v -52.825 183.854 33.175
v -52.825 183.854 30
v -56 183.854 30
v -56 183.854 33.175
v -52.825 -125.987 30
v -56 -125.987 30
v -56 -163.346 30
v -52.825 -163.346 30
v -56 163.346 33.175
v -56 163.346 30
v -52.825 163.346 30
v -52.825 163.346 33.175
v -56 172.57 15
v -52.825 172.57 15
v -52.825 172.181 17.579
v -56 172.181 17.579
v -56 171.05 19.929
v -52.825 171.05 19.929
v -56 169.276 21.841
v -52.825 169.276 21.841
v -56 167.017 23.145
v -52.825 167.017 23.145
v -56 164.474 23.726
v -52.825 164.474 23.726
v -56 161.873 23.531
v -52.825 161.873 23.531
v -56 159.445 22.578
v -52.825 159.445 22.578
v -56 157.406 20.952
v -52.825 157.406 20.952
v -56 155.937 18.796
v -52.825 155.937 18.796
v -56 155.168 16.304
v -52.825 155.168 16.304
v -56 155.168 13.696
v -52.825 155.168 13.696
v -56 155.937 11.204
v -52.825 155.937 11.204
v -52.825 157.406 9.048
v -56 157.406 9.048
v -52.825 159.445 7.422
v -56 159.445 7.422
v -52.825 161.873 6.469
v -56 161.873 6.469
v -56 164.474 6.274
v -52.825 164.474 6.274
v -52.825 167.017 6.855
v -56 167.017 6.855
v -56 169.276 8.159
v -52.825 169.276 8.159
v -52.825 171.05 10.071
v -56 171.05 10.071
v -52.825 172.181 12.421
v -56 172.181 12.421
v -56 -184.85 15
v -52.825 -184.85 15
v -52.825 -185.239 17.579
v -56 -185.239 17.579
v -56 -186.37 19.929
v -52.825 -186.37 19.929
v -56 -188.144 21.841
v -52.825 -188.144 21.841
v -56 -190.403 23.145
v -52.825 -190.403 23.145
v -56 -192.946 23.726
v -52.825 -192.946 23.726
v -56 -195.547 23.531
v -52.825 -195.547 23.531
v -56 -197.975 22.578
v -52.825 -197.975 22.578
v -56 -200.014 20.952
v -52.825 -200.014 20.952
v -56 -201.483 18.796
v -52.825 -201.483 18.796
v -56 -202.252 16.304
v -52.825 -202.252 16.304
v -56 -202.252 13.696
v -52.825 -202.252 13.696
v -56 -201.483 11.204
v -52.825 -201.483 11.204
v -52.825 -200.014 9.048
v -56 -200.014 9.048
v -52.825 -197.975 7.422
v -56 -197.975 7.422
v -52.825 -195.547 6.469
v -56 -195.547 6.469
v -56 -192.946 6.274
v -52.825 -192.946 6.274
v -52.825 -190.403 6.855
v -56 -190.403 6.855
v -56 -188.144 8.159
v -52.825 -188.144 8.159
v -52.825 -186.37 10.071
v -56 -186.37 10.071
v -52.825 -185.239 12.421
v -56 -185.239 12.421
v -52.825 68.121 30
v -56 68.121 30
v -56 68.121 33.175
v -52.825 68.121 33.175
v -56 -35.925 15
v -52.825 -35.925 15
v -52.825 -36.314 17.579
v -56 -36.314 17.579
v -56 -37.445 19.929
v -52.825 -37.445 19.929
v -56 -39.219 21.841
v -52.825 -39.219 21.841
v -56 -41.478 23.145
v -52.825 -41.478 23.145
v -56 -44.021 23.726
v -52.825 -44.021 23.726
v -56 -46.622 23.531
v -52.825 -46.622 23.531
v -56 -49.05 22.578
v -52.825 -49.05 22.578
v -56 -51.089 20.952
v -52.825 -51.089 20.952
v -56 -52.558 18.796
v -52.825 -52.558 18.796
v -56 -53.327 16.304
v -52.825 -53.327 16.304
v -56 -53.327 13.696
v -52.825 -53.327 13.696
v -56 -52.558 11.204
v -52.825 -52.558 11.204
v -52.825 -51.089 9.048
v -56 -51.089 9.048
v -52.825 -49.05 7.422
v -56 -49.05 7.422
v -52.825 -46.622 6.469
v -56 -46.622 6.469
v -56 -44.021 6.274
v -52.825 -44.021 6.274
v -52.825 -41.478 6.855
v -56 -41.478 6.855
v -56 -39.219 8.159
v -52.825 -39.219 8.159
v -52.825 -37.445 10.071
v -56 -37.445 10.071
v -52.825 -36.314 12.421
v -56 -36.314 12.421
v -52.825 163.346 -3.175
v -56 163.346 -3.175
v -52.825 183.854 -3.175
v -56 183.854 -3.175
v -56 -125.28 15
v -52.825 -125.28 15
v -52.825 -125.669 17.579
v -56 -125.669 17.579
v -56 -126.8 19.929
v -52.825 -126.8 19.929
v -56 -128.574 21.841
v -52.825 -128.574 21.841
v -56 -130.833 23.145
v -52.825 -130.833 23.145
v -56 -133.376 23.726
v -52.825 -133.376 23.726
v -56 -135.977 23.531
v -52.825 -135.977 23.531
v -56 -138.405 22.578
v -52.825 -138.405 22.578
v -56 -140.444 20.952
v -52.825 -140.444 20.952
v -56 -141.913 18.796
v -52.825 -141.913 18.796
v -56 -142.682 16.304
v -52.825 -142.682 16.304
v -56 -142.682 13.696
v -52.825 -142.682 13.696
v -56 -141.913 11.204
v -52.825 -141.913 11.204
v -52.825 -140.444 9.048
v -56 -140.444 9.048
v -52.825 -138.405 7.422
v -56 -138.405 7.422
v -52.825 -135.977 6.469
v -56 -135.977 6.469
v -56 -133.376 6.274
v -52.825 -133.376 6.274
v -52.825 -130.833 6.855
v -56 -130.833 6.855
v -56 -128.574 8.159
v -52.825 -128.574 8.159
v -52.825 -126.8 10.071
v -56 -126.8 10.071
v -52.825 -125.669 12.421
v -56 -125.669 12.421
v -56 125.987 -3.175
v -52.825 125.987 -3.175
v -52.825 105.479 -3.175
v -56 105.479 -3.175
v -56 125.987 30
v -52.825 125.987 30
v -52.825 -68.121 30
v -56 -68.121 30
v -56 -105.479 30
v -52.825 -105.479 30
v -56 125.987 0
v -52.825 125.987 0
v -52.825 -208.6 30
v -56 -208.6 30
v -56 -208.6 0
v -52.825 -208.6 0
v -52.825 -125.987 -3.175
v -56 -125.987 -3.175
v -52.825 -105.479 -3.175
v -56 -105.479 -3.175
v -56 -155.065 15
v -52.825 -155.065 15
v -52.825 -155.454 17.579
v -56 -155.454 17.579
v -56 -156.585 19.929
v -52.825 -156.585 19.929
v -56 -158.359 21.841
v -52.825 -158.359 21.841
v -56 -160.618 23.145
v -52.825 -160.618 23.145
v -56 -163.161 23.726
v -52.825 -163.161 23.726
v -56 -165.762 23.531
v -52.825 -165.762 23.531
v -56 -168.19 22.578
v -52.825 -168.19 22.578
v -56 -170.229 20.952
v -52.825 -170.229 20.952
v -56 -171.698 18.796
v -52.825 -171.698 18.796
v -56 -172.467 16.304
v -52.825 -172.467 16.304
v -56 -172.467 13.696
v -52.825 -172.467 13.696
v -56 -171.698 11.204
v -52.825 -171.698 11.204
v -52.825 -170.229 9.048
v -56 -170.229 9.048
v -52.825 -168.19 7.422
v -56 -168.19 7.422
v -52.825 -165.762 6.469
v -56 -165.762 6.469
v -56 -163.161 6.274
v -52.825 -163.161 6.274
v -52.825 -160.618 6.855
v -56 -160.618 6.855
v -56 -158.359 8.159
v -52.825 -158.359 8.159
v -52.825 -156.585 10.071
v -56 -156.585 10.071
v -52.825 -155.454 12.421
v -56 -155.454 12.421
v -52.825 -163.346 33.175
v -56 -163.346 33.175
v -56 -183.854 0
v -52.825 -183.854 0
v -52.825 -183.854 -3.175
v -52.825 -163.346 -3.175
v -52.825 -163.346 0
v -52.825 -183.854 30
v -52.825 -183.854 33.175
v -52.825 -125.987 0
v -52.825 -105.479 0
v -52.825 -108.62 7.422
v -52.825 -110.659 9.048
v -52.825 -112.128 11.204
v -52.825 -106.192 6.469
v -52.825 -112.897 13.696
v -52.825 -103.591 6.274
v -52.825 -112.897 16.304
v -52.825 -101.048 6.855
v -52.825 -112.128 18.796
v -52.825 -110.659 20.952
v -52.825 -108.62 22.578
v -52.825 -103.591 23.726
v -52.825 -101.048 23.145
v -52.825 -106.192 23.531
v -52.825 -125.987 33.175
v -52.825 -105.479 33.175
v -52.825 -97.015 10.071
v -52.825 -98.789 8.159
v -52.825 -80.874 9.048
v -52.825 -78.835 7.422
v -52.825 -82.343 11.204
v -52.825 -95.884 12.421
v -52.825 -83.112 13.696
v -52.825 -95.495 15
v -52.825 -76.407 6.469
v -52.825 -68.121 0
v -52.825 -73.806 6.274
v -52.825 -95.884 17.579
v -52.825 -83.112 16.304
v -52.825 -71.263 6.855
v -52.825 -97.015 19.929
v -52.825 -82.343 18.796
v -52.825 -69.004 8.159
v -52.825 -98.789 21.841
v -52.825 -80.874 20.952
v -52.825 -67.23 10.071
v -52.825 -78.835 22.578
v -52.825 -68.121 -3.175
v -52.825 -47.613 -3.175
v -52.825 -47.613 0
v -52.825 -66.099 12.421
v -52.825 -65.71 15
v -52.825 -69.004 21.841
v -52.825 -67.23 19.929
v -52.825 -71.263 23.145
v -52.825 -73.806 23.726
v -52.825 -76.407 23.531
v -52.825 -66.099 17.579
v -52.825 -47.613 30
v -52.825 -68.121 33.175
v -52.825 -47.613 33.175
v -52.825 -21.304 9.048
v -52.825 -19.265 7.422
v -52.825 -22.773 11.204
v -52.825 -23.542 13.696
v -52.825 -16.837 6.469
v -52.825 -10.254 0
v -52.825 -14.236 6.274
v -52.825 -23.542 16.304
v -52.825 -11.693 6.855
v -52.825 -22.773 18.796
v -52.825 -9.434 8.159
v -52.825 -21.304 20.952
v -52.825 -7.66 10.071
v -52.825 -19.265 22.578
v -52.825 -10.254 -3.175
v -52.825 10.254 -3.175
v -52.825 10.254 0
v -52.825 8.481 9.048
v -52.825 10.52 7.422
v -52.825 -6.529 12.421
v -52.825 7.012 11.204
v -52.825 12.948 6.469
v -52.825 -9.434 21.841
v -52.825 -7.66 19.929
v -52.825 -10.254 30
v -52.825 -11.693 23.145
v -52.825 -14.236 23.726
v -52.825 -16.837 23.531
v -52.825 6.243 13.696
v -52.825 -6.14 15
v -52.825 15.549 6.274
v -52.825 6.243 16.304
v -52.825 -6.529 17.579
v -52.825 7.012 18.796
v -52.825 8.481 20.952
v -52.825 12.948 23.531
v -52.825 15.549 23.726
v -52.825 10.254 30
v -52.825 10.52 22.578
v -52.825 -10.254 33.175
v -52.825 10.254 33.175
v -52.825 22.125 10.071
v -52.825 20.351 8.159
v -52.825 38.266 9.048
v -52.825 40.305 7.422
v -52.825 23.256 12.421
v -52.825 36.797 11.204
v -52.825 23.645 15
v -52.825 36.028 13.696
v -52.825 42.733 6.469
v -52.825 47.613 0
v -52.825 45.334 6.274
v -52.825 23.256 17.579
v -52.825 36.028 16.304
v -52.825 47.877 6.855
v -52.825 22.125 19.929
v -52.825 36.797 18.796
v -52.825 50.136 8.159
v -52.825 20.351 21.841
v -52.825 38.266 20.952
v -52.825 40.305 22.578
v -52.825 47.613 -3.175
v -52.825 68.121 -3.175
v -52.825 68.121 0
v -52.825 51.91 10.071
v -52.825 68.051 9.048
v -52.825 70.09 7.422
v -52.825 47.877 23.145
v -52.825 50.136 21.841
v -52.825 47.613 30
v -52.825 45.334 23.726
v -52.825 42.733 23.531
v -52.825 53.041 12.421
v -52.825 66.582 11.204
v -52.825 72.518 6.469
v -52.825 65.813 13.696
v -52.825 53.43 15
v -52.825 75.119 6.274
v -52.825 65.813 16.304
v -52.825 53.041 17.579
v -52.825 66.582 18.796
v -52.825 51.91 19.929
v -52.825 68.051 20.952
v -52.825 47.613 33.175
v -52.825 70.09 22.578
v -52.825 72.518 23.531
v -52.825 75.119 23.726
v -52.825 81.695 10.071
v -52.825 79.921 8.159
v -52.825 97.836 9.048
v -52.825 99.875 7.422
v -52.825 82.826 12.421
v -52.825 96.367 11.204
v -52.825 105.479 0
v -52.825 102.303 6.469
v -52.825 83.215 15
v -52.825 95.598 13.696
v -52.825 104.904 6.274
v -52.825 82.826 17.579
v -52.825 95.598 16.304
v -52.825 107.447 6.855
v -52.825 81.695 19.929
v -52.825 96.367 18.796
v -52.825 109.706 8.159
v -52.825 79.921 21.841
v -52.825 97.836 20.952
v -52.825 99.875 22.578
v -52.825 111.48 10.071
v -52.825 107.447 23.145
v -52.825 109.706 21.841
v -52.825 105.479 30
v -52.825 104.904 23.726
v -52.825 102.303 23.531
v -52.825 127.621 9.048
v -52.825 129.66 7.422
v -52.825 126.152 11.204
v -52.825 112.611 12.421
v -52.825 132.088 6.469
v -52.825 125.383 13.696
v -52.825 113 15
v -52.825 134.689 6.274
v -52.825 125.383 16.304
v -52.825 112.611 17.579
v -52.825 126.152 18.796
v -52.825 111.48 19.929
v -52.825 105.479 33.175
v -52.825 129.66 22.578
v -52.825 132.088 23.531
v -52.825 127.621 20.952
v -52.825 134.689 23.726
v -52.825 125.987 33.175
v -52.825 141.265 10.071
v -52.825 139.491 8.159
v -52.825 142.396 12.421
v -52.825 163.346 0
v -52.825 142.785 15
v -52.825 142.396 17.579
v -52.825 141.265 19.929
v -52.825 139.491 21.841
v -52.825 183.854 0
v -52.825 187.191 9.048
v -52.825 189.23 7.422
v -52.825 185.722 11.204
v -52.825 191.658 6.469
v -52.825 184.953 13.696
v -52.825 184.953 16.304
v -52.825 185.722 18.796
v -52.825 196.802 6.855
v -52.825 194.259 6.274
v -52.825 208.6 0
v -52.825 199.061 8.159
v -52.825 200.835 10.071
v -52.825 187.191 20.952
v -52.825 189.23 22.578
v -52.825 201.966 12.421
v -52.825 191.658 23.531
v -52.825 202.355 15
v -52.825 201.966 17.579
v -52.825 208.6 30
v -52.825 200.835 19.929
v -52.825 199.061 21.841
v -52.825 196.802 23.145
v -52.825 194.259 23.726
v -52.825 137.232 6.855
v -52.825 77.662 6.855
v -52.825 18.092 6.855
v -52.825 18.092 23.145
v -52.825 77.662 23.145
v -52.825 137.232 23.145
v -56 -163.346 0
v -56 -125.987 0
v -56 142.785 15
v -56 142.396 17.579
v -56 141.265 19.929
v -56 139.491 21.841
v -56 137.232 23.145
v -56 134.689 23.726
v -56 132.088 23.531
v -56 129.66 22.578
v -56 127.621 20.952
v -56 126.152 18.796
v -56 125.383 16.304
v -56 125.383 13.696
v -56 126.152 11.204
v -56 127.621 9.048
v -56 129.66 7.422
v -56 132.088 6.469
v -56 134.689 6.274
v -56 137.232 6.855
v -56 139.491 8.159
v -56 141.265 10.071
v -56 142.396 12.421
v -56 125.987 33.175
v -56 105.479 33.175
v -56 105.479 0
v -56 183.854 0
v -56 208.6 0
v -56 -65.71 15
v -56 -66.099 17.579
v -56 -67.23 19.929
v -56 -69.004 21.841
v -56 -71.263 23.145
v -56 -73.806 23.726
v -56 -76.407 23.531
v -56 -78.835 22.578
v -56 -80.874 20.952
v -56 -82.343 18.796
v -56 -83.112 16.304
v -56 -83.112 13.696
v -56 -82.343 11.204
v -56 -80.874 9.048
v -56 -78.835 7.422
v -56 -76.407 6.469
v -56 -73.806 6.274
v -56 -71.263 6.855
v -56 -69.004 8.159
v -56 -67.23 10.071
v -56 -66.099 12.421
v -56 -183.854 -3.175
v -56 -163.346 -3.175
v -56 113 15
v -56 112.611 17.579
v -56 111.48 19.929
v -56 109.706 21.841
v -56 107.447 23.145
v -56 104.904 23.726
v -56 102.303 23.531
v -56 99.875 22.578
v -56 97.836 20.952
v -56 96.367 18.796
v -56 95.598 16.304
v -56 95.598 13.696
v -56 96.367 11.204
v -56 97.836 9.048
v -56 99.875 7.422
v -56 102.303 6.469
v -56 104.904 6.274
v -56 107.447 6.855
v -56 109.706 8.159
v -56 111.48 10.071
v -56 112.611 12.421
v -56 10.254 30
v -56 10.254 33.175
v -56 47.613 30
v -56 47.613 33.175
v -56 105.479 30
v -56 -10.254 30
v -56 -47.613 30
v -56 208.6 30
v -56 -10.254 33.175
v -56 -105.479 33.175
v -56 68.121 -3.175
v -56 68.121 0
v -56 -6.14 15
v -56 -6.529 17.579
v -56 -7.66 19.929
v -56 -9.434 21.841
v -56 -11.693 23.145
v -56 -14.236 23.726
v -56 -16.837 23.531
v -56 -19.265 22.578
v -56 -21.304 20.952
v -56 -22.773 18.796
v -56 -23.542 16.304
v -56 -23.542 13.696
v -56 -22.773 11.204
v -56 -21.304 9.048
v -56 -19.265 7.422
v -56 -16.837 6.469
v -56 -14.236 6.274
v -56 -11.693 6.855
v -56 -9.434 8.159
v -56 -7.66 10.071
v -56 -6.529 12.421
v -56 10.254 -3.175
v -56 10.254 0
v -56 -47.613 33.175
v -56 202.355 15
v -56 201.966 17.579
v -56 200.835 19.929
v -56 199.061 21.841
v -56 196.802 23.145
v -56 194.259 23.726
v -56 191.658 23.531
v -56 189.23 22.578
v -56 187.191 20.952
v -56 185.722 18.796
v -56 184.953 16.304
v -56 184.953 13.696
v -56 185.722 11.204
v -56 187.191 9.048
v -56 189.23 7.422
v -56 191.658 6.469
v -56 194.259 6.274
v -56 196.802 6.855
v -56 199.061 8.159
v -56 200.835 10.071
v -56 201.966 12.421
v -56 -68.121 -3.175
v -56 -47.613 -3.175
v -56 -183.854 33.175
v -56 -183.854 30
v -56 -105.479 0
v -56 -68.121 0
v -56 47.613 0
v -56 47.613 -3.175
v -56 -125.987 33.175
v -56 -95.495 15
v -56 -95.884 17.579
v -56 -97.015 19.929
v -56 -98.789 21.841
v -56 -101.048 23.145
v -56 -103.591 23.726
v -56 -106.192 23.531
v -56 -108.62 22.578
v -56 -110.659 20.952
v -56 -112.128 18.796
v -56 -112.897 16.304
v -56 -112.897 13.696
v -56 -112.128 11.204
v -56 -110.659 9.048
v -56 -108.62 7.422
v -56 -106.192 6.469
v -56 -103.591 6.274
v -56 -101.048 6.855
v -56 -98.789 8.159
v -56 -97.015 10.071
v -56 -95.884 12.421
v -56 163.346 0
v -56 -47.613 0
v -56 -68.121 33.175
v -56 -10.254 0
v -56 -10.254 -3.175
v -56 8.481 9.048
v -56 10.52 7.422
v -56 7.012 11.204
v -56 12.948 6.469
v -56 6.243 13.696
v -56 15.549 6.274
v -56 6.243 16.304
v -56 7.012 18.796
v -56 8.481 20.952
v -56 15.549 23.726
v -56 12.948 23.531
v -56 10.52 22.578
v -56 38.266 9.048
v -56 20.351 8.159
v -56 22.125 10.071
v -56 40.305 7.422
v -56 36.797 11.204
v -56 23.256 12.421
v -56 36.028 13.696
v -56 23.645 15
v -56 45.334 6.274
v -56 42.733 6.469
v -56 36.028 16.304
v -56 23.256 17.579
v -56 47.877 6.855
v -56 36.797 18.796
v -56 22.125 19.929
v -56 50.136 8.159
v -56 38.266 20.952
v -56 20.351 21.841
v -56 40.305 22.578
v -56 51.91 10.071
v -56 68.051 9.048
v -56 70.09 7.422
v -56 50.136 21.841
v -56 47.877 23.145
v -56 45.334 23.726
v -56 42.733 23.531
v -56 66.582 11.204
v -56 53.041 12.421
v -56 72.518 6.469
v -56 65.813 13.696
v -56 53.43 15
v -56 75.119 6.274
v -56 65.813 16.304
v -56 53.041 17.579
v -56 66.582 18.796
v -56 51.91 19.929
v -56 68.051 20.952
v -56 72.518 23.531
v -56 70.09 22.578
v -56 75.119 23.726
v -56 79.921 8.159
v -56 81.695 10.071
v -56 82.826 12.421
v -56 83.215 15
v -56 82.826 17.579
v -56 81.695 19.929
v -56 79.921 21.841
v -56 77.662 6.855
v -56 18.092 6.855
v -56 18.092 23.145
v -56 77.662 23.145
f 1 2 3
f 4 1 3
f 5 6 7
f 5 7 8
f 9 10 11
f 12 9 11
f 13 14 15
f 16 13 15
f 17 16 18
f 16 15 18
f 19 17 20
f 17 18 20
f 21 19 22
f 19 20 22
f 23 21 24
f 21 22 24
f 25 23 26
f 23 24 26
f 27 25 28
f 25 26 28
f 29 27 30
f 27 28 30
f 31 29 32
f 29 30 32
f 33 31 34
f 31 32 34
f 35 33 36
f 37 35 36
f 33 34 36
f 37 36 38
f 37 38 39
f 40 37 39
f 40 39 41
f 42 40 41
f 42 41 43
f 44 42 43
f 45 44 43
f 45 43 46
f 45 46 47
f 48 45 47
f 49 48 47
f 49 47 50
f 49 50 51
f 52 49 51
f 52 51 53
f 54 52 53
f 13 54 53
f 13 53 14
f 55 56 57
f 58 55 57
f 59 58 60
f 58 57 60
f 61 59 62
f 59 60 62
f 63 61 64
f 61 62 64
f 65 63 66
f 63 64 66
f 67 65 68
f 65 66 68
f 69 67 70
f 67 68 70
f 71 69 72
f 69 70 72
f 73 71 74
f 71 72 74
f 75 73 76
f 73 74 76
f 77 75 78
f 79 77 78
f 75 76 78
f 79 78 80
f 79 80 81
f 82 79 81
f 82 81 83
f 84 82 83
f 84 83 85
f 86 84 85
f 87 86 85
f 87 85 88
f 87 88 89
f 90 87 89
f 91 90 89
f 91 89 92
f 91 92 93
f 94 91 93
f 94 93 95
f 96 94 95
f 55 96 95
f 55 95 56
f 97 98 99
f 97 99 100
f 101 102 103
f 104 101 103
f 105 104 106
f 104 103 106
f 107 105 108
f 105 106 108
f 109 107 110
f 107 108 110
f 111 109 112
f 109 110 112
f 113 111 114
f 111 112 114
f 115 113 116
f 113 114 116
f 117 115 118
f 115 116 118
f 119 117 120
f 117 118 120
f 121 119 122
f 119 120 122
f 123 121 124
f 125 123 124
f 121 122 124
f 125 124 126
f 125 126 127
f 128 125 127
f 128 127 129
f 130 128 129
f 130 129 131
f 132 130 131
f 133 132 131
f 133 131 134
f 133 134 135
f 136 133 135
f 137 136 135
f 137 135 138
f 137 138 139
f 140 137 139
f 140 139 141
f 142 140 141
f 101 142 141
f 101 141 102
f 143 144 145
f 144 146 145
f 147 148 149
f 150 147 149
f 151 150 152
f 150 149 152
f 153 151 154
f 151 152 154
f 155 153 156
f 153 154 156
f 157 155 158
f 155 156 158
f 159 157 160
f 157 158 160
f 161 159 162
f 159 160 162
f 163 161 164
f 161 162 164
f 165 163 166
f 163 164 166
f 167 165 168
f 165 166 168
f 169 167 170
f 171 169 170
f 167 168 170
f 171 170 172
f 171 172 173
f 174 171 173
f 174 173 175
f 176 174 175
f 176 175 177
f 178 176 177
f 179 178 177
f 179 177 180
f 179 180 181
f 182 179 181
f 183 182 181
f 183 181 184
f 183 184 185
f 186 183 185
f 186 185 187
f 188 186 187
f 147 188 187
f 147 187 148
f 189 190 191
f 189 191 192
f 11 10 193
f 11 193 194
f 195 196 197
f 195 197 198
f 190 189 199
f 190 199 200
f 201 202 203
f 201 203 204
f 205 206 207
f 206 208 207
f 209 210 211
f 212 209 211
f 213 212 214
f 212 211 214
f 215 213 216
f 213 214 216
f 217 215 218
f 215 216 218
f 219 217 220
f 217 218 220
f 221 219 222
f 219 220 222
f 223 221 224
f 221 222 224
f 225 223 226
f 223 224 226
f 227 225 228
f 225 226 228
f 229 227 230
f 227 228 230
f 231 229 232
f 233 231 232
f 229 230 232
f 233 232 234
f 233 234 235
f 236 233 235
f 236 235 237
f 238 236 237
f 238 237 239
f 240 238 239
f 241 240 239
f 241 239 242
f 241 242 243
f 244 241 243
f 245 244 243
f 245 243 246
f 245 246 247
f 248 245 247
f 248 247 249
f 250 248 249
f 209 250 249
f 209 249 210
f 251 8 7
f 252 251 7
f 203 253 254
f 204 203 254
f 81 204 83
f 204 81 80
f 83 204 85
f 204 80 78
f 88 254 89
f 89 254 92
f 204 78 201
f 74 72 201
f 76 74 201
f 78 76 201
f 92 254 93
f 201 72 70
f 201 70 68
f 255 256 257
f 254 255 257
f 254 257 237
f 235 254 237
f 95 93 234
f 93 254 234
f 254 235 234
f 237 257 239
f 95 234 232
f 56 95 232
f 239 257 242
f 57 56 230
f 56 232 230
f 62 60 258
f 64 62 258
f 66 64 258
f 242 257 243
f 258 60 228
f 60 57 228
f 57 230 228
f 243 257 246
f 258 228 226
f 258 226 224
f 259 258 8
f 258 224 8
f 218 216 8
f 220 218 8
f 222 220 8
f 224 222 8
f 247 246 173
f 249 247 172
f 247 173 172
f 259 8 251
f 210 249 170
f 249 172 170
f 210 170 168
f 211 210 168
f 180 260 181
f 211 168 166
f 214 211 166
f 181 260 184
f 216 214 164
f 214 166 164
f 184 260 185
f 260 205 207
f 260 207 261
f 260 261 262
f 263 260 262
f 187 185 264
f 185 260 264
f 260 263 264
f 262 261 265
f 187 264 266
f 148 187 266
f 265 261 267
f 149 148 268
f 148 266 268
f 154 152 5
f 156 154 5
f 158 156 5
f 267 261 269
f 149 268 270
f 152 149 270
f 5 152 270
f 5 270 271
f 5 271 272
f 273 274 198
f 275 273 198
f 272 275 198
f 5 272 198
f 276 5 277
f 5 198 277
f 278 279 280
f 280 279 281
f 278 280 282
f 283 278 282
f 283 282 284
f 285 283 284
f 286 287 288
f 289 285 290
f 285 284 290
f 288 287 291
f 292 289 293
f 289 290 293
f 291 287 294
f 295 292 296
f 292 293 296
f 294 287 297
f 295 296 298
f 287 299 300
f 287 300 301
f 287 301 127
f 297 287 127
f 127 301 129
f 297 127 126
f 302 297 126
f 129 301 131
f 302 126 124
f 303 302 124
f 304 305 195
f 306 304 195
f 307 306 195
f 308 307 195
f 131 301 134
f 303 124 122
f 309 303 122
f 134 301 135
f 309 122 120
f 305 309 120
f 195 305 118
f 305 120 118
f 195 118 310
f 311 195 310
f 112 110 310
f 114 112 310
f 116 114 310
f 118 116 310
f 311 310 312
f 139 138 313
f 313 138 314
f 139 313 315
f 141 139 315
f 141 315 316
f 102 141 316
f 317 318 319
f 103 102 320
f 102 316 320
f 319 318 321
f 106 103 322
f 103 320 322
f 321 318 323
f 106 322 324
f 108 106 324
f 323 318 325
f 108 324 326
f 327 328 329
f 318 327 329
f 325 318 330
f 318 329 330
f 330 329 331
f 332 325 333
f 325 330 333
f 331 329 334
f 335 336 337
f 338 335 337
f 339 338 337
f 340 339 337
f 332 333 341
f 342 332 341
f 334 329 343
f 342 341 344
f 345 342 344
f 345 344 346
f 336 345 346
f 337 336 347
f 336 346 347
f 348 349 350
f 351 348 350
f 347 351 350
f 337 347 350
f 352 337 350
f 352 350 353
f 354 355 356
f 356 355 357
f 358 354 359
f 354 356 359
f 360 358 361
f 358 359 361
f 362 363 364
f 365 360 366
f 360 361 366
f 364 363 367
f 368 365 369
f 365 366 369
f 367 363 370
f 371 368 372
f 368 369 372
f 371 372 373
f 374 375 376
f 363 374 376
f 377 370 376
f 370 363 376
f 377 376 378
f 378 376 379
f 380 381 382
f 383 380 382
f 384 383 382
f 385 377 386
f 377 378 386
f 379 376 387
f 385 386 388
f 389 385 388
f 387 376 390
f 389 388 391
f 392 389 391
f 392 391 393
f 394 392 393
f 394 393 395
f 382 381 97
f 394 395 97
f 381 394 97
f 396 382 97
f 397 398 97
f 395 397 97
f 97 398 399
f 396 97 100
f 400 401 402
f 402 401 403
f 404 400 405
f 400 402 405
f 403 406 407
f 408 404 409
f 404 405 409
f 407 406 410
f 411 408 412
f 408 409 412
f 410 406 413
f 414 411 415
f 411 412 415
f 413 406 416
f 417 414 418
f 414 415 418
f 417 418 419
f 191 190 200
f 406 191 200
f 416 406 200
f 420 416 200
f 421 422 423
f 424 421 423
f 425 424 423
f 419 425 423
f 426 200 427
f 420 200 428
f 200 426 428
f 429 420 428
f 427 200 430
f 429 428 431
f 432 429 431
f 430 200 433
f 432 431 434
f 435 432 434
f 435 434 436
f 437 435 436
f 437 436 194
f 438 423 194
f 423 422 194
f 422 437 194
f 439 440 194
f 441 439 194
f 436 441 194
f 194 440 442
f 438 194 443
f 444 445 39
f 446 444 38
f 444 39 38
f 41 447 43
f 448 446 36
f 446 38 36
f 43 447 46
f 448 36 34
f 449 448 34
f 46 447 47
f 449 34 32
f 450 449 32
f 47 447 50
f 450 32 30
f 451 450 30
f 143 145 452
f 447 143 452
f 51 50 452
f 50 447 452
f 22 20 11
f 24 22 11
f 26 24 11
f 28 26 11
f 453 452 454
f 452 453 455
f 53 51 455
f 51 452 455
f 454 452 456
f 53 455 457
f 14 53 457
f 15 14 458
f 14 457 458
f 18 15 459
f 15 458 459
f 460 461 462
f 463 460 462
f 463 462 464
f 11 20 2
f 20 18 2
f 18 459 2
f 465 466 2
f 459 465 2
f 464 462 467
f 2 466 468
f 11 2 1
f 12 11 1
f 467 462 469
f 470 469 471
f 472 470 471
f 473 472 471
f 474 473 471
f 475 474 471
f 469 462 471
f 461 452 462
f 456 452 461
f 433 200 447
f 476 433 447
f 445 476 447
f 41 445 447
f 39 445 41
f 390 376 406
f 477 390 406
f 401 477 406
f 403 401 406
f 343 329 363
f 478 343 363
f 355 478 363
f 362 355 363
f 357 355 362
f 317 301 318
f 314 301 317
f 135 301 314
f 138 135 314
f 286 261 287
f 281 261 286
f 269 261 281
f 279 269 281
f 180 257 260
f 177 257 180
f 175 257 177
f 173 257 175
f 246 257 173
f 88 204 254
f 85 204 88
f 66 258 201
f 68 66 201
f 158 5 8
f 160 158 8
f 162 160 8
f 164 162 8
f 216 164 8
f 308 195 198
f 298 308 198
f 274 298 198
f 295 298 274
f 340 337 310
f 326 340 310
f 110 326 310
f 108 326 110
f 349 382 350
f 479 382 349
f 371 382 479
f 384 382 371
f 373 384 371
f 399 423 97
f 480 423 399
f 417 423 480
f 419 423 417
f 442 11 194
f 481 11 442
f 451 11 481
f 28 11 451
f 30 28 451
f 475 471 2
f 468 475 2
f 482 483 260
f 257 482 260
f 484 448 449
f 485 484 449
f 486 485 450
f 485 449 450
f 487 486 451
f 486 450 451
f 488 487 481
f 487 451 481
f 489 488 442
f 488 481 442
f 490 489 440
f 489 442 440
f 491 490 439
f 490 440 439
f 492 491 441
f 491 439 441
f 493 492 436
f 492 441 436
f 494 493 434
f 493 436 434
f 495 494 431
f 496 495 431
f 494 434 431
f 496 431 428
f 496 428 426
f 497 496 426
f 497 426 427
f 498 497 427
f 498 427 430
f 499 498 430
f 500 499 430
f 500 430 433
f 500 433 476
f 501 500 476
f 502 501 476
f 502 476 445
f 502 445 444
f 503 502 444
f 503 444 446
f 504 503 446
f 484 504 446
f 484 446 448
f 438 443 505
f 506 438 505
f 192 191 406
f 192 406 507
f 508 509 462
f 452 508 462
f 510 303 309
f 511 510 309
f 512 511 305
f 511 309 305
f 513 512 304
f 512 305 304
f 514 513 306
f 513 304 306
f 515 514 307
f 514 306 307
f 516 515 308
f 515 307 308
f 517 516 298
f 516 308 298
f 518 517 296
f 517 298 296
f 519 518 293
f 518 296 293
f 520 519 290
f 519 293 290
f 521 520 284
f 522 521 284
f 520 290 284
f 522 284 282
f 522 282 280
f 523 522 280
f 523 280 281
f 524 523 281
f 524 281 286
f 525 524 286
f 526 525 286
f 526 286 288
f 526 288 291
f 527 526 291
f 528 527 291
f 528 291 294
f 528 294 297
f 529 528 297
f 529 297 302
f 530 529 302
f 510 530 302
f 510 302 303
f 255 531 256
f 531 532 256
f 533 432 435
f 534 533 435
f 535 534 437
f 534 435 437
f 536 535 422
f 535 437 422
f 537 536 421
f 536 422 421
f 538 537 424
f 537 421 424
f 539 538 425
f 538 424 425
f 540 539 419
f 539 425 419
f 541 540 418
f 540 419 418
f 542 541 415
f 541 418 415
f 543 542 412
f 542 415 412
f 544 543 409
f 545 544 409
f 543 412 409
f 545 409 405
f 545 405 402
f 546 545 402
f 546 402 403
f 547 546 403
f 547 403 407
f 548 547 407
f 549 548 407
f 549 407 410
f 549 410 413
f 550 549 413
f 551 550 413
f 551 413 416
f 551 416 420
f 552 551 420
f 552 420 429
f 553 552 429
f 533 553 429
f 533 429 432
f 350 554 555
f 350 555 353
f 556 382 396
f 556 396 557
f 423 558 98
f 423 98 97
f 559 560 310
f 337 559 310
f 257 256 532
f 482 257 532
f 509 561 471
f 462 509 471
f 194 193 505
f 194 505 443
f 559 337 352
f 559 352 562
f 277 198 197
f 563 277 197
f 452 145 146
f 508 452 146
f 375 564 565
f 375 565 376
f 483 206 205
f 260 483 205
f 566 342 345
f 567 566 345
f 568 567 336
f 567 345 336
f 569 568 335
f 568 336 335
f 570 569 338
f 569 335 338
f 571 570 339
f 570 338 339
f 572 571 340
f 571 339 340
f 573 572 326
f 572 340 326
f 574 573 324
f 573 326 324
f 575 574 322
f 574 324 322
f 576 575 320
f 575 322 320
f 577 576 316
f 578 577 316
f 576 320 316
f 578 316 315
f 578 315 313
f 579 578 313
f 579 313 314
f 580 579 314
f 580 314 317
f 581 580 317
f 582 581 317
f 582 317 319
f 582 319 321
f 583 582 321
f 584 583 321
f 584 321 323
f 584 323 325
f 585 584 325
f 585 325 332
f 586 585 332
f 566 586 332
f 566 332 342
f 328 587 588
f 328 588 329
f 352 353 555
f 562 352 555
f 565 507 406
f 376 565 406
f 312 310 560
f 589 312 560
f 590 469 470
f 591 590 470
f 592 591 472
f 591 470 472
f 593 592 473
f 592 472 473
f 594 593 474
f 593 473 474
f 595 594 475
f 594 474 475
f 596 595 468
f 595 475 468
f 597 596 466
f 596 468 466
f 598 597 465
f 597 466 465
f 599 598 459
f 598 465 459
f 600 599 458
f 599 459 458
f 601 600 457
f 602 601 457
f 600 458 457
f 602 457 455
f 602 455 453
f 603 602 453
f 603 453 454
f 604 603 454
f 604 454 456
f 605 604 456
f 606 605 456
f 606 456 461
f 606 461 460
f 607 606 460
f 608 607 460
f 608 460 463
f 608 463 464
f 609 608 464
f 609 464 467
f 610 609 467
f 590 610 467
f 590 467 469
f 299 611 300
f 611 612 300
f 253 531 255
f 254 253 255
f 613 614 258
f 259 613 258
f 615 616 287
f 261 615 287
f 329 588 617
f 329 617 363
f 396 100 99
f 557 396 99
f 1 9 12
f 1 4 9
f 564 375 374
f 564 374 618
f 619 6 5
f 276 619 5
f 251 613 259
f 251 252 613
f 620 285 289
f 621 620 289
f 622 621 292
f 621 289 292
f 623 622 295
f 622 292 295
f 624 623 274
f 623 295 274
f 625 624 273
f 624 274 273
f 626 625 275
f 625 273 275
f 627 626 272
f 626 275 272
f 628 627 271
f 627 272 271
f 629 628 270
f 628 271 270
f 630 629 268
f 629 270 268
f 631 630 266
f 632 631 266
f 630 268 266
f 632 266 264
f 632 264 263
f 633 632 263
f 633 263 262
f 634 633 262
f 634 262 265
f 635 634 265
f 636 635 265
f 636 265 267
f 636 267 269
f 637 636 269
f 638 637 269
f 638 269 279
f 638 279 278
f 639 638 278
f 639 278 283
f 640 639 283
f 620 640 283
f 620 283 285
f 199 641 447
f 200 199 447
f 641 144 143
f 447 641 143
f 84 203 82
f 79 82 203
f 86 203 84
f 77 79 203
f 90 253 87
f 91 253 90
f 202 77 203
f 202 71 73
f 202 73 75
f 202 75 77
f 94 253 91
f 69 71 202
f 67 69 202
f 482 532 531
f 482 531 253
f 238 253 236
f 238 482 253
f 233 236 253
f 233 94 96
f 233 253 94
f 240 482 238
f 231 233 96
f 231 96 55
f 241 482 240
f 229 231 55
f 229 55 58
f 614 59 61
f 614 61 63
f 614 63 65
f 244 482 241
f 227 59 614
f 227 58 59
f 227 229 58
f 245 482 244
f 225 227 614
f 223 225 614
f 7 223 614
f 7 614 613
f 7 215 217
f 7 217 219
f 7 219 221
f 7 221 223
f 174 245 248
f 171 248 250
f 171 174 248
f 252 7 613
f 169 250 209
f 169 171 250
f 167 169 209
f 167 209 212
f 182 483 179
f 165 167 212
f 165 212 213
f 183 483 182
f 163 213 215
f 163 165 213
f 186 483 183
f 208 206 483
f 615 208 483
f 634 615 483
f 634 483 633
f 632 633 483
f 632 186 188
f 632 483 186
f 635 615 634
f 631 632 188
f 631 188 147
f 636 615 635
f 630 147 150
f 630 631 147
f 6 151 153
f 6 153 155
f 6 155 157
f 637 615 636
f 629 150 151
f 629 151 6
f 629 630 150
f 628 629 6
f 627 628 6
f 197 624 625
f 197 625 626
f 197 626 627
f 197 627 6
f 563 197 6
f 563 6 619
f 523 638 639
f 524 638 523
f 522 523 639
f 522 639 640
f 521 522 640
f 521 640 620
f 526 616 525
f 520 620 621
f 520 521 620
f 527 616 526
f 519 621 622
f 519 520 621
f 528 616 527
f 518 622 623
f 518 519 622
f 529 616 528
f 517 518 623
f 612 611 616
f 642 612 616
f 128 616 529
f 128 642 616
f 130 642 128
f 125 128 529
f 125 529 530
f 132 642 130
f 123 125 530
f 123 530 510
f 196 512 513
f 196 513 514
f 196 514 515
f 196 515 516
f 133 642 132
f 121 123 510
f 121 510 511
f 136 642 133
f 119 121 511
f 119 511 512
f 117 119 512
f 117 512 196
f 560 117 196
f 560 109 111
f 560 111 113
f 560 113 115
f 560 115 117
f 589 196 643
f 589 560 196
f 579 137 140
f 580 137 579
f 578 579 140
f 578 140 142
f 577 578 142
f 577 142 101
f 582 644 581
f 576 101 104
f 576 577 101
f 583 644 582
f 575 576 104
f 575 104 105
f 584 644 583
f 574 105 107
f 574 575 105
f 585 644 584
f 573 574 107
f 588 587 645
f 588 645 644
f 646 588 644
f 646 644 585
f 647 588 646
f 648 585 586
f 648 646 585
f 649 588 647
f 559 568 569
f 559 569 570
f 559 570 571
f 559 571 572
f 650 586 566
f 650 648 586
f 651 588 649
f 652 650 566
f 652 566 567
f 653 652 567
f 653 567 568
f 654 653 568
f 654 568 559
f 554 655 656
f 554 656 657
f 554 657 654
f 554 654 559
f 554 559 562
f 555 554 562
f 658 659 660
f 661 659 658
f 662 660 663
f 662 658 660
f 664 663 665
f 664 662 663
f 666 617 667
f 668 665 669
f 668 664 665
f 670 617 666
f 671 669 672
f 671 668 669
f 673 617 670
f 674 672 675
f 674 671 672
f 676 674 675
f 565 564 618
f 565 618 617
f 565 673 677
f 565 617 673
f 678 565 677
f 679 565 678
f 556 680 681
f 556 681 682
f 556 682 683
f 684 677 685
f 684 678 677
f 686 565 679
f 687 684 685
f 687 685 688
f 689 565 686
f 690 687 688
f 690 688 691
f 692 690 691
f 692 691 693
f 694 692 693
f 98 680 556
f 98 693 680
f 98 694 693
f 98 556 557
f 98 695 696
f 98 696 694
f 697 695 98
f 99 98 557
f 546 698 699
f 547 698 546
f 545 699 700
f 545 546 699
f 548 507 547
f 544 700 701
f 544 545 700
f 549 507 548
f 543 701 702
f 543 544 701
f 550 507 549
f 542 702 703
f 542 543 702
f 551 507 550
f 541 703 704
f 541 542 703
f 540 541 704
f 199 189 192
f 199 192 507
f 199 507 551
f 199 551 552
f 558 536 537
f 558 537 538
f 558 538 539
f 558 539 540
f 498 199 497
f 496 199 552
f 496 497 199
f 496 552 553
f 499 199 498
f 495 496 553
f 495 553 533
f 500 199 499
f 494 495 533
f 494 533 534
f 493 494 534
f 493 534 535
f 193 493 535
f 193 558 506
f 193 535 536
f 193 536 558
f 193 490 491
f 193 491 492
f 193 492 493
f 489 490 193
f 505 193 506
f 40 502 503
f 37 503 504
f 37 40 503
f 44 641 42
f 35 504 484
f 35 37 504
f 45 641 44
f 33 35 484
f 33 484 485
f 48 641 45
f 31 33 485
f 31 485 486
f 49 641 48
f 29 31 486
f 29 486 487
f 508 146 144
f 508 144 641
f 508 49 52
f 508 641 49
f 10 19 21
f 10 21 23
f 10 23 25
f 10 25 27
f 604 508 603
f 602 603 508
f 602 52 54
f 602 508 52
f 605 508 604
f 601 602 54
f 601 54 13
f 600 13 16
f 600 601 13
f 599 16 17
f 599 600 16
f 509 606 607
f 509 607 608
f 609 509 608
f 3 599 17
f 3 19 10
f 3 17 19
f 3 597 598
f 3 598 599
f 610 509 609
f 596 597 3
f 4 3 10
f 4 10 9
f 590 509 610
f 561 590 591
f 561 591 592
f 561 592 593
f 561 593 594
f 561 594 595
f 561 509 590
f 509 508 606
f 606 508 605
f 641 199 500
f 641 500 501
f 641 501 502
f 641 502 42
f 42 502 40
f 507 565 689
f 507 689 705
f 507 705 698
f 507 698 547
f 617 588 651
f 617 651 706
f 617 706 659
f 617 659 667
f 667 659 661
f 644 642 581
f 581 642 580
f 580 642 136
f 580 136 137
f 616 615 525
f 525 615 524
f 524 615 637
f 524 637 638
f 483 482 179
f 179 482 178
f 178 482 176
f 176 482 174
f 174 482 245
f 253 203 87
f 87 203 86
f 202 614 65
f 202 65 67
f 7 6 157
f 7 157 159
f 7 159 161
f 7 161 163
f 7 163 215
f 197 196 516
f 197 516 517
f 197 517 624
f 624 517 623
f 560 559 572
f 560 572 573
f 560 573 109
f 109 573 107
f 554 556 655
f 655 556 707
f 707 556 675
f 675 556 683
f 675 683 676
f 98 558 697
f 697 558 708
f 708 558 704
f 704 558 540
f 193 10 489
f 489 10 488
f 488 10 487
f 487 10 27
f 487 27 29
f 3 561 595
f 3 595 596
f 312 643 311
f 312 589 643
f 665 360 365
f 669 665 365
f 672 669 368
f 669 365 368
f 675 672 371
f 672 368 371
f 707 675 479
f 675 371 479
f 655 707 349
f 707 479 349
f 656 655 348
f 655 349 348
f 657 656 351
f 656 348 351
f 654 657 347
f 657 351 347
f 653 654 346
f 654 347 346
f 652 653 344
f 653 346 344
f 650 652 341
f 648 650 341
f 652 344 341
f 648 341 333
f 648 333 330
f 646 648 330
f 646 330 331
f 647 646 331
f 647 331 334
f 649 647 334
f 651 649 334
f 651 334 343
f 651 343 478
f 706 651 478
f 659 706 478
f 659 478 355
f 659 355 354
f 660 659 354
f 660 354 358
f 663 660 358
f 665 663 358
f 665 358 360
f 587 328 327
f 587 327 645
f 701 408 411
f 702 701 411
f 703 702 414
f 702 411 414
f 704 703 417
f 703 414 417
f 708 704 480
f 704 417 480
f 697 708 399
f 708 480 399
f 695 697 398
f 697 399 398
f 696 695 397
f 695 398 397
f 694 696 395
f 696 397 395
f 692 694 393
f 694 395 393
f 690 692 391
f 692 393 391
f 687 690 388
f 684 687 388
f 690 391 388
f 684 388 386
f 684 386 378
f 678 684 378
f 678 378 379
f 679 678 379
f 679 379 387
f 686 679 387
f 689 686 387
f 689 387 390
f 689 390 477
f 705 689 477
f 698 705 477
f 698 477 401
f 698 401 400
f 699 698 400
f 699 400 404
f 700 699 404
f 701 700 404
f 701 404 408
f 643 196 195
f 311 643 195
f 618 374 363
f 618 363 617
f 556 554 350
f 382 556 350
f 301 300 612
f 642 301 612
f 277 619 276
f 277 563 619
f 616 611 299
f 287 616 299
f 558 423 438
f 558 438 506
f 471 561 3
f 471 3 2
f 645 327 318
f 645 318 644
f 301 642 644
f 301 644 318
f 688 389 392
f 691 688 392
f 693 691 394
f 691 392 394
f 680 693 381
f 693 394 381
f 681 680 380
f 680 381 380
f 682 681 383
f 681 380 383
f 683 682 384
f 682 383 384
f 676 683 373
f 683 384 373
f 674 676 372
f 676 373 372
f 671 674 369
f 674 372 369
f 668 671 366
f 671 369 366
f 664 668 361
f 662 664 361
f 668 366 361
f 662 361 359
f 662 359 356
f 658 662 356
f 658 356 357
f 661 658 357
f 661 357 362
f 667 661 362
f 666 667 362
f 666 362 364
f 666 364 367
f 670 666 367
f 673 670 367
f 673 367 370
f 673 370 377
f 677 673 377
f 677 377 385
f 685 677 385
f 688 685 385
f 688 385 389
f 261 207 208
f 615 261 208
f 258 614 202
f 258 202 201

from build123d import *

# Parameters (mm, degrees)
BOSS_EXTRU_1_DEPTH        = 33.175
BOSS_EXTRU_1_DEPTH_BACK   = 3.175
BOSS_EXTRU_1_2_DEPTH      = 33.175
BOSS_EXTRU_1_2_DEPTH_BACK = 3.175
BOSS_EXTRU_1_3_DEPTH      = 33.175
BOSS_EXTRU_1_3_DEPTH_BACK = 3.175
BOSS_EXTRU_1_4_DEPTH      = 33.175
BOSS_EXTRU_1_4_DEPTH_BACK = 3.175
BOSS_EXTRU_1_5_DEPTH      = 33.175
BOSS_EXTRU_1_5_DEPTH_BACK = 3.175
BOSS_EXTRU_1_6_DEPTH      = 33.175
BOSS_EXTRU_1_6_DEPTH_BACK = 3.175
BOSS_EXTRU_1_7_DEPTH      = 33.175
BOSS_EXTRU_1_7_DEPTH_BACK = 3.175
BOSS_EXTRU_2_DEPTH        = 198.346
BOSS_EXTRU_2_DEPTH_BACK   = 218.854
ESQUISSE2_W               = 3.175
ESQUISSE2_H               = 30
CUT_EXTRUDE1_REACH        = 213.245
SKETCH1_R                 = 8.75
LPATTERN1_COUNT           = 14
LPATTERN1_PITCH           = 29.785


with BuildPart() as part:
    # Esquisse1 → Boss.-Extru.1 (new, two sides: drawn at the far end of the back side and taken through both)
    with BuildSketch(Plane.XY.offset(-BOSS_EXTRU_1_DEPTH_BACK)):
        Polygon((-56, 163.6), (-56, 163.346), (-52.825, 163.346), (-52.825, 163.6), (-52.825, 183.6), (-52.825, 183.854), (-56, 183.854), (-56, 183.6), align=None)
    extrude(amount=BOSS_EXTRU_1_DEPTH + BOSS_EXTRU_1_DEPTH_BACK)



with BuildPart() as body_2:
    # Esquisse1 → Boss.-Extru.1 2 (new, two sides: drawn at the far end of the back side and taken through both)
    with BuildSketch(Plane.XY.offset(-BOSS_EXTRU_1_2_DEPTH_BACK)):
        Polygon((-56, 125.733333333), (-56, 125.987333333), (-52.825, 125.987333333), (-52.825, 125.733333333), (-52.825, 105.733333333), (-52.825, 105.479333333), (-56, 105.479333333), (-56, 105.733333333), align=None)
    extrude(amount=BOSS_EXTRU_1_2_DEPTH + BOSS_EXTRU_1_2_DEPTH_BACK)


with BuildPart() as body_3:
    # Esquisse1 → Boss.-Extru.1 3 (new, two sides: drawn at the far end of the back side and taken through both)
    with BuildSketch(Plane.XY.offset(-BOSS_EXTRU_1_3_DEPTH_BACK)):
        Polygon((-56, 67.866666667), (-56, 68.120666667), (-52.825, 68.120666667), (-52.825, 67.866666667), (-52.825, 47.866666667), (-52.825, 47.612666667), (-56, 47.612666667), (-56, 47.866666667), align=None)
    extrude(amount=BOSS_EXTRU_1_3_DEPTH + BOSS_EXTRU_1_3_DEPTH_BACK)


with BuildPart() as body_4:
    # Esquisse1 → Boss.-Extru.1 4 (new, two sides: drawn at the far end of the back side and taken through both)
    with BuildSketch(Plane.XY.offset(-BOSS_EXTRU_1_4_DEPTH_BACK)):
        Polygon((-56, 10), (-56, 10.254), (-52.825, 10.254), (-52.825, 10), (-52.825, -10), (-52.825, -10.254), (-56, -10.254), (-56, -10), align=None)
    extrude(amount=BOSS_EXTRU_1_4_DEPTH + BOSS_EXTRU_1_4_DEPTH_BACK)


with BuildPart() as body_5:
    # Esquisse1 → Boss.-Extru.1 5 (new, two sides: drawn at the far end of the back side and taken through both)
    with BuildSketch(Plane.XY.offset(-BOSS_EXTRU_1_5_DEPTH_BACK)):
        Polygon((-56, -163.6), (-56, -183.6), (-56, -183.854), (-52.825, -183.854), (-52.825, -183.6), (-52.825, -163.6), (-52.825, -163.346), (-56, -163.346), align=None)
    extrude(amount=BOSS_EXTRU_1_5_DEPTH + BOSS_EXTRU_1_5_DEPTH_BACK)


with BuildPart() as body_6:
    # Esquisse1 → Boss.-Extru.1 6 (new, two sides: drawn at the far end of the back side and taken through both)
    with BuildSketch(Plane.XY.offset(-BOSS_EXTRU_1_6_DEPTH_BACK)):
        Polygon((-56, -105.733333333), (-56, -125.733333333), (-56, -125.987333333), (-52.825, -125.987333333), (-52.825, -125.733333333), (-52.825, -105.733333333), (-52.825, -105.479333333), (-56, -105.479333333), align=None)
    extrude(amount=BOSS_EXTRU_1_6_DEPTH + BOSS_EXTRU_1_6_DEPTH_BACK)


with BuildPart() as body_7:
    # Esquisse1 → Boss.-Extru.1 7 (new, two sides: drawn at the far end of the back side and taken through both)
    with BuildSketch(Plane.XY.offset(-BOSS_EXTRU_1_7_DEPTH_BACK)):
        Polygon((-56, -47.866666667), (-56, -67.866666667), (-56, -68.120666667), (-52.825, -68.120666667), (-52.825, -67.866666667), (-52.825, -47.866666667), (-52.825, -47.612666667), (-56, -47.612666667), align=None)
    extrude(amount=BOSS_EXTRU_1_7_DEPTH + BOSS_EXTRU_1_7_DEPTH_BACK)


with BuildPart() as part_1:
    add(part.part)

    add(body_2.part)  # Boss.-Extru.2 merges body 2

    add(body_3.part)  # Boss.-Extru.2 merges body 3

    add(body_4.part)  # Boss.-Extru.2 merges body 4

    add(body_5.part)  # Boss.-Extru.2 merges body 5

    add(body_6.part)  # Boss.-Extru.2 merges body 6

    add(body_7.part)  # Boss.-Extru.2 merges body 7
    # Esquisse2 → Boss.-Extru.2 (add, two sides: drawn at the far end of the back side and taken through both)
    with BuildSketch(Plane.XZ.offset(10.254).offset(-BOSS_EXTRU_2_DEPTH_BACK)):
        with Locations((-54.4125, 15)):
            Rectangle(ESQUISSE2_W, ESQUISSE2_H)
    extrude(amount=BOSS_EXTRU_2_DEPTH + BOSS_EXTRU_2_DEPTH_BACK)

    # Sketch1 → Cut-Extrude1 (cut, up to next)
    with BuildSketch(Plane(origin=(-52.825000001, 0, 0), x_dir=(0, 0, -1), z_dir=(1.0, 8.38677334054915e-12, 0)), mode=Mode.PRIVATE) as cut_extrude1_sk1:
        with Locations(Location((-15, -193.6, 0), (0, 0, 90))):
            Circle(SKETCH1_R)
    cut_extrude1_tool1 = extrude(cut_extrude1_sk1.sketch, amount=-CUT_EXTRUDE1_REACH, mode=Mode.PRIVATE) & part_1.part
    cut_extrude1 = cut_extrude1_tool1.solids().sort_by_distance((-52.825, -193.6, 15))[0]
    add(cut_extrude1, mode=Mode.SUBTRACT)

    # LPattern1: Cut-Extrude1 ×14
    with Locations(*[(0, i * LPATTERN1_PITCH, 0) for i in range(1, LPATTERN1_COUNT)]):
        add(cut_extrude1, mode=Mode.SUBTRACT)


solid = part_1.part
